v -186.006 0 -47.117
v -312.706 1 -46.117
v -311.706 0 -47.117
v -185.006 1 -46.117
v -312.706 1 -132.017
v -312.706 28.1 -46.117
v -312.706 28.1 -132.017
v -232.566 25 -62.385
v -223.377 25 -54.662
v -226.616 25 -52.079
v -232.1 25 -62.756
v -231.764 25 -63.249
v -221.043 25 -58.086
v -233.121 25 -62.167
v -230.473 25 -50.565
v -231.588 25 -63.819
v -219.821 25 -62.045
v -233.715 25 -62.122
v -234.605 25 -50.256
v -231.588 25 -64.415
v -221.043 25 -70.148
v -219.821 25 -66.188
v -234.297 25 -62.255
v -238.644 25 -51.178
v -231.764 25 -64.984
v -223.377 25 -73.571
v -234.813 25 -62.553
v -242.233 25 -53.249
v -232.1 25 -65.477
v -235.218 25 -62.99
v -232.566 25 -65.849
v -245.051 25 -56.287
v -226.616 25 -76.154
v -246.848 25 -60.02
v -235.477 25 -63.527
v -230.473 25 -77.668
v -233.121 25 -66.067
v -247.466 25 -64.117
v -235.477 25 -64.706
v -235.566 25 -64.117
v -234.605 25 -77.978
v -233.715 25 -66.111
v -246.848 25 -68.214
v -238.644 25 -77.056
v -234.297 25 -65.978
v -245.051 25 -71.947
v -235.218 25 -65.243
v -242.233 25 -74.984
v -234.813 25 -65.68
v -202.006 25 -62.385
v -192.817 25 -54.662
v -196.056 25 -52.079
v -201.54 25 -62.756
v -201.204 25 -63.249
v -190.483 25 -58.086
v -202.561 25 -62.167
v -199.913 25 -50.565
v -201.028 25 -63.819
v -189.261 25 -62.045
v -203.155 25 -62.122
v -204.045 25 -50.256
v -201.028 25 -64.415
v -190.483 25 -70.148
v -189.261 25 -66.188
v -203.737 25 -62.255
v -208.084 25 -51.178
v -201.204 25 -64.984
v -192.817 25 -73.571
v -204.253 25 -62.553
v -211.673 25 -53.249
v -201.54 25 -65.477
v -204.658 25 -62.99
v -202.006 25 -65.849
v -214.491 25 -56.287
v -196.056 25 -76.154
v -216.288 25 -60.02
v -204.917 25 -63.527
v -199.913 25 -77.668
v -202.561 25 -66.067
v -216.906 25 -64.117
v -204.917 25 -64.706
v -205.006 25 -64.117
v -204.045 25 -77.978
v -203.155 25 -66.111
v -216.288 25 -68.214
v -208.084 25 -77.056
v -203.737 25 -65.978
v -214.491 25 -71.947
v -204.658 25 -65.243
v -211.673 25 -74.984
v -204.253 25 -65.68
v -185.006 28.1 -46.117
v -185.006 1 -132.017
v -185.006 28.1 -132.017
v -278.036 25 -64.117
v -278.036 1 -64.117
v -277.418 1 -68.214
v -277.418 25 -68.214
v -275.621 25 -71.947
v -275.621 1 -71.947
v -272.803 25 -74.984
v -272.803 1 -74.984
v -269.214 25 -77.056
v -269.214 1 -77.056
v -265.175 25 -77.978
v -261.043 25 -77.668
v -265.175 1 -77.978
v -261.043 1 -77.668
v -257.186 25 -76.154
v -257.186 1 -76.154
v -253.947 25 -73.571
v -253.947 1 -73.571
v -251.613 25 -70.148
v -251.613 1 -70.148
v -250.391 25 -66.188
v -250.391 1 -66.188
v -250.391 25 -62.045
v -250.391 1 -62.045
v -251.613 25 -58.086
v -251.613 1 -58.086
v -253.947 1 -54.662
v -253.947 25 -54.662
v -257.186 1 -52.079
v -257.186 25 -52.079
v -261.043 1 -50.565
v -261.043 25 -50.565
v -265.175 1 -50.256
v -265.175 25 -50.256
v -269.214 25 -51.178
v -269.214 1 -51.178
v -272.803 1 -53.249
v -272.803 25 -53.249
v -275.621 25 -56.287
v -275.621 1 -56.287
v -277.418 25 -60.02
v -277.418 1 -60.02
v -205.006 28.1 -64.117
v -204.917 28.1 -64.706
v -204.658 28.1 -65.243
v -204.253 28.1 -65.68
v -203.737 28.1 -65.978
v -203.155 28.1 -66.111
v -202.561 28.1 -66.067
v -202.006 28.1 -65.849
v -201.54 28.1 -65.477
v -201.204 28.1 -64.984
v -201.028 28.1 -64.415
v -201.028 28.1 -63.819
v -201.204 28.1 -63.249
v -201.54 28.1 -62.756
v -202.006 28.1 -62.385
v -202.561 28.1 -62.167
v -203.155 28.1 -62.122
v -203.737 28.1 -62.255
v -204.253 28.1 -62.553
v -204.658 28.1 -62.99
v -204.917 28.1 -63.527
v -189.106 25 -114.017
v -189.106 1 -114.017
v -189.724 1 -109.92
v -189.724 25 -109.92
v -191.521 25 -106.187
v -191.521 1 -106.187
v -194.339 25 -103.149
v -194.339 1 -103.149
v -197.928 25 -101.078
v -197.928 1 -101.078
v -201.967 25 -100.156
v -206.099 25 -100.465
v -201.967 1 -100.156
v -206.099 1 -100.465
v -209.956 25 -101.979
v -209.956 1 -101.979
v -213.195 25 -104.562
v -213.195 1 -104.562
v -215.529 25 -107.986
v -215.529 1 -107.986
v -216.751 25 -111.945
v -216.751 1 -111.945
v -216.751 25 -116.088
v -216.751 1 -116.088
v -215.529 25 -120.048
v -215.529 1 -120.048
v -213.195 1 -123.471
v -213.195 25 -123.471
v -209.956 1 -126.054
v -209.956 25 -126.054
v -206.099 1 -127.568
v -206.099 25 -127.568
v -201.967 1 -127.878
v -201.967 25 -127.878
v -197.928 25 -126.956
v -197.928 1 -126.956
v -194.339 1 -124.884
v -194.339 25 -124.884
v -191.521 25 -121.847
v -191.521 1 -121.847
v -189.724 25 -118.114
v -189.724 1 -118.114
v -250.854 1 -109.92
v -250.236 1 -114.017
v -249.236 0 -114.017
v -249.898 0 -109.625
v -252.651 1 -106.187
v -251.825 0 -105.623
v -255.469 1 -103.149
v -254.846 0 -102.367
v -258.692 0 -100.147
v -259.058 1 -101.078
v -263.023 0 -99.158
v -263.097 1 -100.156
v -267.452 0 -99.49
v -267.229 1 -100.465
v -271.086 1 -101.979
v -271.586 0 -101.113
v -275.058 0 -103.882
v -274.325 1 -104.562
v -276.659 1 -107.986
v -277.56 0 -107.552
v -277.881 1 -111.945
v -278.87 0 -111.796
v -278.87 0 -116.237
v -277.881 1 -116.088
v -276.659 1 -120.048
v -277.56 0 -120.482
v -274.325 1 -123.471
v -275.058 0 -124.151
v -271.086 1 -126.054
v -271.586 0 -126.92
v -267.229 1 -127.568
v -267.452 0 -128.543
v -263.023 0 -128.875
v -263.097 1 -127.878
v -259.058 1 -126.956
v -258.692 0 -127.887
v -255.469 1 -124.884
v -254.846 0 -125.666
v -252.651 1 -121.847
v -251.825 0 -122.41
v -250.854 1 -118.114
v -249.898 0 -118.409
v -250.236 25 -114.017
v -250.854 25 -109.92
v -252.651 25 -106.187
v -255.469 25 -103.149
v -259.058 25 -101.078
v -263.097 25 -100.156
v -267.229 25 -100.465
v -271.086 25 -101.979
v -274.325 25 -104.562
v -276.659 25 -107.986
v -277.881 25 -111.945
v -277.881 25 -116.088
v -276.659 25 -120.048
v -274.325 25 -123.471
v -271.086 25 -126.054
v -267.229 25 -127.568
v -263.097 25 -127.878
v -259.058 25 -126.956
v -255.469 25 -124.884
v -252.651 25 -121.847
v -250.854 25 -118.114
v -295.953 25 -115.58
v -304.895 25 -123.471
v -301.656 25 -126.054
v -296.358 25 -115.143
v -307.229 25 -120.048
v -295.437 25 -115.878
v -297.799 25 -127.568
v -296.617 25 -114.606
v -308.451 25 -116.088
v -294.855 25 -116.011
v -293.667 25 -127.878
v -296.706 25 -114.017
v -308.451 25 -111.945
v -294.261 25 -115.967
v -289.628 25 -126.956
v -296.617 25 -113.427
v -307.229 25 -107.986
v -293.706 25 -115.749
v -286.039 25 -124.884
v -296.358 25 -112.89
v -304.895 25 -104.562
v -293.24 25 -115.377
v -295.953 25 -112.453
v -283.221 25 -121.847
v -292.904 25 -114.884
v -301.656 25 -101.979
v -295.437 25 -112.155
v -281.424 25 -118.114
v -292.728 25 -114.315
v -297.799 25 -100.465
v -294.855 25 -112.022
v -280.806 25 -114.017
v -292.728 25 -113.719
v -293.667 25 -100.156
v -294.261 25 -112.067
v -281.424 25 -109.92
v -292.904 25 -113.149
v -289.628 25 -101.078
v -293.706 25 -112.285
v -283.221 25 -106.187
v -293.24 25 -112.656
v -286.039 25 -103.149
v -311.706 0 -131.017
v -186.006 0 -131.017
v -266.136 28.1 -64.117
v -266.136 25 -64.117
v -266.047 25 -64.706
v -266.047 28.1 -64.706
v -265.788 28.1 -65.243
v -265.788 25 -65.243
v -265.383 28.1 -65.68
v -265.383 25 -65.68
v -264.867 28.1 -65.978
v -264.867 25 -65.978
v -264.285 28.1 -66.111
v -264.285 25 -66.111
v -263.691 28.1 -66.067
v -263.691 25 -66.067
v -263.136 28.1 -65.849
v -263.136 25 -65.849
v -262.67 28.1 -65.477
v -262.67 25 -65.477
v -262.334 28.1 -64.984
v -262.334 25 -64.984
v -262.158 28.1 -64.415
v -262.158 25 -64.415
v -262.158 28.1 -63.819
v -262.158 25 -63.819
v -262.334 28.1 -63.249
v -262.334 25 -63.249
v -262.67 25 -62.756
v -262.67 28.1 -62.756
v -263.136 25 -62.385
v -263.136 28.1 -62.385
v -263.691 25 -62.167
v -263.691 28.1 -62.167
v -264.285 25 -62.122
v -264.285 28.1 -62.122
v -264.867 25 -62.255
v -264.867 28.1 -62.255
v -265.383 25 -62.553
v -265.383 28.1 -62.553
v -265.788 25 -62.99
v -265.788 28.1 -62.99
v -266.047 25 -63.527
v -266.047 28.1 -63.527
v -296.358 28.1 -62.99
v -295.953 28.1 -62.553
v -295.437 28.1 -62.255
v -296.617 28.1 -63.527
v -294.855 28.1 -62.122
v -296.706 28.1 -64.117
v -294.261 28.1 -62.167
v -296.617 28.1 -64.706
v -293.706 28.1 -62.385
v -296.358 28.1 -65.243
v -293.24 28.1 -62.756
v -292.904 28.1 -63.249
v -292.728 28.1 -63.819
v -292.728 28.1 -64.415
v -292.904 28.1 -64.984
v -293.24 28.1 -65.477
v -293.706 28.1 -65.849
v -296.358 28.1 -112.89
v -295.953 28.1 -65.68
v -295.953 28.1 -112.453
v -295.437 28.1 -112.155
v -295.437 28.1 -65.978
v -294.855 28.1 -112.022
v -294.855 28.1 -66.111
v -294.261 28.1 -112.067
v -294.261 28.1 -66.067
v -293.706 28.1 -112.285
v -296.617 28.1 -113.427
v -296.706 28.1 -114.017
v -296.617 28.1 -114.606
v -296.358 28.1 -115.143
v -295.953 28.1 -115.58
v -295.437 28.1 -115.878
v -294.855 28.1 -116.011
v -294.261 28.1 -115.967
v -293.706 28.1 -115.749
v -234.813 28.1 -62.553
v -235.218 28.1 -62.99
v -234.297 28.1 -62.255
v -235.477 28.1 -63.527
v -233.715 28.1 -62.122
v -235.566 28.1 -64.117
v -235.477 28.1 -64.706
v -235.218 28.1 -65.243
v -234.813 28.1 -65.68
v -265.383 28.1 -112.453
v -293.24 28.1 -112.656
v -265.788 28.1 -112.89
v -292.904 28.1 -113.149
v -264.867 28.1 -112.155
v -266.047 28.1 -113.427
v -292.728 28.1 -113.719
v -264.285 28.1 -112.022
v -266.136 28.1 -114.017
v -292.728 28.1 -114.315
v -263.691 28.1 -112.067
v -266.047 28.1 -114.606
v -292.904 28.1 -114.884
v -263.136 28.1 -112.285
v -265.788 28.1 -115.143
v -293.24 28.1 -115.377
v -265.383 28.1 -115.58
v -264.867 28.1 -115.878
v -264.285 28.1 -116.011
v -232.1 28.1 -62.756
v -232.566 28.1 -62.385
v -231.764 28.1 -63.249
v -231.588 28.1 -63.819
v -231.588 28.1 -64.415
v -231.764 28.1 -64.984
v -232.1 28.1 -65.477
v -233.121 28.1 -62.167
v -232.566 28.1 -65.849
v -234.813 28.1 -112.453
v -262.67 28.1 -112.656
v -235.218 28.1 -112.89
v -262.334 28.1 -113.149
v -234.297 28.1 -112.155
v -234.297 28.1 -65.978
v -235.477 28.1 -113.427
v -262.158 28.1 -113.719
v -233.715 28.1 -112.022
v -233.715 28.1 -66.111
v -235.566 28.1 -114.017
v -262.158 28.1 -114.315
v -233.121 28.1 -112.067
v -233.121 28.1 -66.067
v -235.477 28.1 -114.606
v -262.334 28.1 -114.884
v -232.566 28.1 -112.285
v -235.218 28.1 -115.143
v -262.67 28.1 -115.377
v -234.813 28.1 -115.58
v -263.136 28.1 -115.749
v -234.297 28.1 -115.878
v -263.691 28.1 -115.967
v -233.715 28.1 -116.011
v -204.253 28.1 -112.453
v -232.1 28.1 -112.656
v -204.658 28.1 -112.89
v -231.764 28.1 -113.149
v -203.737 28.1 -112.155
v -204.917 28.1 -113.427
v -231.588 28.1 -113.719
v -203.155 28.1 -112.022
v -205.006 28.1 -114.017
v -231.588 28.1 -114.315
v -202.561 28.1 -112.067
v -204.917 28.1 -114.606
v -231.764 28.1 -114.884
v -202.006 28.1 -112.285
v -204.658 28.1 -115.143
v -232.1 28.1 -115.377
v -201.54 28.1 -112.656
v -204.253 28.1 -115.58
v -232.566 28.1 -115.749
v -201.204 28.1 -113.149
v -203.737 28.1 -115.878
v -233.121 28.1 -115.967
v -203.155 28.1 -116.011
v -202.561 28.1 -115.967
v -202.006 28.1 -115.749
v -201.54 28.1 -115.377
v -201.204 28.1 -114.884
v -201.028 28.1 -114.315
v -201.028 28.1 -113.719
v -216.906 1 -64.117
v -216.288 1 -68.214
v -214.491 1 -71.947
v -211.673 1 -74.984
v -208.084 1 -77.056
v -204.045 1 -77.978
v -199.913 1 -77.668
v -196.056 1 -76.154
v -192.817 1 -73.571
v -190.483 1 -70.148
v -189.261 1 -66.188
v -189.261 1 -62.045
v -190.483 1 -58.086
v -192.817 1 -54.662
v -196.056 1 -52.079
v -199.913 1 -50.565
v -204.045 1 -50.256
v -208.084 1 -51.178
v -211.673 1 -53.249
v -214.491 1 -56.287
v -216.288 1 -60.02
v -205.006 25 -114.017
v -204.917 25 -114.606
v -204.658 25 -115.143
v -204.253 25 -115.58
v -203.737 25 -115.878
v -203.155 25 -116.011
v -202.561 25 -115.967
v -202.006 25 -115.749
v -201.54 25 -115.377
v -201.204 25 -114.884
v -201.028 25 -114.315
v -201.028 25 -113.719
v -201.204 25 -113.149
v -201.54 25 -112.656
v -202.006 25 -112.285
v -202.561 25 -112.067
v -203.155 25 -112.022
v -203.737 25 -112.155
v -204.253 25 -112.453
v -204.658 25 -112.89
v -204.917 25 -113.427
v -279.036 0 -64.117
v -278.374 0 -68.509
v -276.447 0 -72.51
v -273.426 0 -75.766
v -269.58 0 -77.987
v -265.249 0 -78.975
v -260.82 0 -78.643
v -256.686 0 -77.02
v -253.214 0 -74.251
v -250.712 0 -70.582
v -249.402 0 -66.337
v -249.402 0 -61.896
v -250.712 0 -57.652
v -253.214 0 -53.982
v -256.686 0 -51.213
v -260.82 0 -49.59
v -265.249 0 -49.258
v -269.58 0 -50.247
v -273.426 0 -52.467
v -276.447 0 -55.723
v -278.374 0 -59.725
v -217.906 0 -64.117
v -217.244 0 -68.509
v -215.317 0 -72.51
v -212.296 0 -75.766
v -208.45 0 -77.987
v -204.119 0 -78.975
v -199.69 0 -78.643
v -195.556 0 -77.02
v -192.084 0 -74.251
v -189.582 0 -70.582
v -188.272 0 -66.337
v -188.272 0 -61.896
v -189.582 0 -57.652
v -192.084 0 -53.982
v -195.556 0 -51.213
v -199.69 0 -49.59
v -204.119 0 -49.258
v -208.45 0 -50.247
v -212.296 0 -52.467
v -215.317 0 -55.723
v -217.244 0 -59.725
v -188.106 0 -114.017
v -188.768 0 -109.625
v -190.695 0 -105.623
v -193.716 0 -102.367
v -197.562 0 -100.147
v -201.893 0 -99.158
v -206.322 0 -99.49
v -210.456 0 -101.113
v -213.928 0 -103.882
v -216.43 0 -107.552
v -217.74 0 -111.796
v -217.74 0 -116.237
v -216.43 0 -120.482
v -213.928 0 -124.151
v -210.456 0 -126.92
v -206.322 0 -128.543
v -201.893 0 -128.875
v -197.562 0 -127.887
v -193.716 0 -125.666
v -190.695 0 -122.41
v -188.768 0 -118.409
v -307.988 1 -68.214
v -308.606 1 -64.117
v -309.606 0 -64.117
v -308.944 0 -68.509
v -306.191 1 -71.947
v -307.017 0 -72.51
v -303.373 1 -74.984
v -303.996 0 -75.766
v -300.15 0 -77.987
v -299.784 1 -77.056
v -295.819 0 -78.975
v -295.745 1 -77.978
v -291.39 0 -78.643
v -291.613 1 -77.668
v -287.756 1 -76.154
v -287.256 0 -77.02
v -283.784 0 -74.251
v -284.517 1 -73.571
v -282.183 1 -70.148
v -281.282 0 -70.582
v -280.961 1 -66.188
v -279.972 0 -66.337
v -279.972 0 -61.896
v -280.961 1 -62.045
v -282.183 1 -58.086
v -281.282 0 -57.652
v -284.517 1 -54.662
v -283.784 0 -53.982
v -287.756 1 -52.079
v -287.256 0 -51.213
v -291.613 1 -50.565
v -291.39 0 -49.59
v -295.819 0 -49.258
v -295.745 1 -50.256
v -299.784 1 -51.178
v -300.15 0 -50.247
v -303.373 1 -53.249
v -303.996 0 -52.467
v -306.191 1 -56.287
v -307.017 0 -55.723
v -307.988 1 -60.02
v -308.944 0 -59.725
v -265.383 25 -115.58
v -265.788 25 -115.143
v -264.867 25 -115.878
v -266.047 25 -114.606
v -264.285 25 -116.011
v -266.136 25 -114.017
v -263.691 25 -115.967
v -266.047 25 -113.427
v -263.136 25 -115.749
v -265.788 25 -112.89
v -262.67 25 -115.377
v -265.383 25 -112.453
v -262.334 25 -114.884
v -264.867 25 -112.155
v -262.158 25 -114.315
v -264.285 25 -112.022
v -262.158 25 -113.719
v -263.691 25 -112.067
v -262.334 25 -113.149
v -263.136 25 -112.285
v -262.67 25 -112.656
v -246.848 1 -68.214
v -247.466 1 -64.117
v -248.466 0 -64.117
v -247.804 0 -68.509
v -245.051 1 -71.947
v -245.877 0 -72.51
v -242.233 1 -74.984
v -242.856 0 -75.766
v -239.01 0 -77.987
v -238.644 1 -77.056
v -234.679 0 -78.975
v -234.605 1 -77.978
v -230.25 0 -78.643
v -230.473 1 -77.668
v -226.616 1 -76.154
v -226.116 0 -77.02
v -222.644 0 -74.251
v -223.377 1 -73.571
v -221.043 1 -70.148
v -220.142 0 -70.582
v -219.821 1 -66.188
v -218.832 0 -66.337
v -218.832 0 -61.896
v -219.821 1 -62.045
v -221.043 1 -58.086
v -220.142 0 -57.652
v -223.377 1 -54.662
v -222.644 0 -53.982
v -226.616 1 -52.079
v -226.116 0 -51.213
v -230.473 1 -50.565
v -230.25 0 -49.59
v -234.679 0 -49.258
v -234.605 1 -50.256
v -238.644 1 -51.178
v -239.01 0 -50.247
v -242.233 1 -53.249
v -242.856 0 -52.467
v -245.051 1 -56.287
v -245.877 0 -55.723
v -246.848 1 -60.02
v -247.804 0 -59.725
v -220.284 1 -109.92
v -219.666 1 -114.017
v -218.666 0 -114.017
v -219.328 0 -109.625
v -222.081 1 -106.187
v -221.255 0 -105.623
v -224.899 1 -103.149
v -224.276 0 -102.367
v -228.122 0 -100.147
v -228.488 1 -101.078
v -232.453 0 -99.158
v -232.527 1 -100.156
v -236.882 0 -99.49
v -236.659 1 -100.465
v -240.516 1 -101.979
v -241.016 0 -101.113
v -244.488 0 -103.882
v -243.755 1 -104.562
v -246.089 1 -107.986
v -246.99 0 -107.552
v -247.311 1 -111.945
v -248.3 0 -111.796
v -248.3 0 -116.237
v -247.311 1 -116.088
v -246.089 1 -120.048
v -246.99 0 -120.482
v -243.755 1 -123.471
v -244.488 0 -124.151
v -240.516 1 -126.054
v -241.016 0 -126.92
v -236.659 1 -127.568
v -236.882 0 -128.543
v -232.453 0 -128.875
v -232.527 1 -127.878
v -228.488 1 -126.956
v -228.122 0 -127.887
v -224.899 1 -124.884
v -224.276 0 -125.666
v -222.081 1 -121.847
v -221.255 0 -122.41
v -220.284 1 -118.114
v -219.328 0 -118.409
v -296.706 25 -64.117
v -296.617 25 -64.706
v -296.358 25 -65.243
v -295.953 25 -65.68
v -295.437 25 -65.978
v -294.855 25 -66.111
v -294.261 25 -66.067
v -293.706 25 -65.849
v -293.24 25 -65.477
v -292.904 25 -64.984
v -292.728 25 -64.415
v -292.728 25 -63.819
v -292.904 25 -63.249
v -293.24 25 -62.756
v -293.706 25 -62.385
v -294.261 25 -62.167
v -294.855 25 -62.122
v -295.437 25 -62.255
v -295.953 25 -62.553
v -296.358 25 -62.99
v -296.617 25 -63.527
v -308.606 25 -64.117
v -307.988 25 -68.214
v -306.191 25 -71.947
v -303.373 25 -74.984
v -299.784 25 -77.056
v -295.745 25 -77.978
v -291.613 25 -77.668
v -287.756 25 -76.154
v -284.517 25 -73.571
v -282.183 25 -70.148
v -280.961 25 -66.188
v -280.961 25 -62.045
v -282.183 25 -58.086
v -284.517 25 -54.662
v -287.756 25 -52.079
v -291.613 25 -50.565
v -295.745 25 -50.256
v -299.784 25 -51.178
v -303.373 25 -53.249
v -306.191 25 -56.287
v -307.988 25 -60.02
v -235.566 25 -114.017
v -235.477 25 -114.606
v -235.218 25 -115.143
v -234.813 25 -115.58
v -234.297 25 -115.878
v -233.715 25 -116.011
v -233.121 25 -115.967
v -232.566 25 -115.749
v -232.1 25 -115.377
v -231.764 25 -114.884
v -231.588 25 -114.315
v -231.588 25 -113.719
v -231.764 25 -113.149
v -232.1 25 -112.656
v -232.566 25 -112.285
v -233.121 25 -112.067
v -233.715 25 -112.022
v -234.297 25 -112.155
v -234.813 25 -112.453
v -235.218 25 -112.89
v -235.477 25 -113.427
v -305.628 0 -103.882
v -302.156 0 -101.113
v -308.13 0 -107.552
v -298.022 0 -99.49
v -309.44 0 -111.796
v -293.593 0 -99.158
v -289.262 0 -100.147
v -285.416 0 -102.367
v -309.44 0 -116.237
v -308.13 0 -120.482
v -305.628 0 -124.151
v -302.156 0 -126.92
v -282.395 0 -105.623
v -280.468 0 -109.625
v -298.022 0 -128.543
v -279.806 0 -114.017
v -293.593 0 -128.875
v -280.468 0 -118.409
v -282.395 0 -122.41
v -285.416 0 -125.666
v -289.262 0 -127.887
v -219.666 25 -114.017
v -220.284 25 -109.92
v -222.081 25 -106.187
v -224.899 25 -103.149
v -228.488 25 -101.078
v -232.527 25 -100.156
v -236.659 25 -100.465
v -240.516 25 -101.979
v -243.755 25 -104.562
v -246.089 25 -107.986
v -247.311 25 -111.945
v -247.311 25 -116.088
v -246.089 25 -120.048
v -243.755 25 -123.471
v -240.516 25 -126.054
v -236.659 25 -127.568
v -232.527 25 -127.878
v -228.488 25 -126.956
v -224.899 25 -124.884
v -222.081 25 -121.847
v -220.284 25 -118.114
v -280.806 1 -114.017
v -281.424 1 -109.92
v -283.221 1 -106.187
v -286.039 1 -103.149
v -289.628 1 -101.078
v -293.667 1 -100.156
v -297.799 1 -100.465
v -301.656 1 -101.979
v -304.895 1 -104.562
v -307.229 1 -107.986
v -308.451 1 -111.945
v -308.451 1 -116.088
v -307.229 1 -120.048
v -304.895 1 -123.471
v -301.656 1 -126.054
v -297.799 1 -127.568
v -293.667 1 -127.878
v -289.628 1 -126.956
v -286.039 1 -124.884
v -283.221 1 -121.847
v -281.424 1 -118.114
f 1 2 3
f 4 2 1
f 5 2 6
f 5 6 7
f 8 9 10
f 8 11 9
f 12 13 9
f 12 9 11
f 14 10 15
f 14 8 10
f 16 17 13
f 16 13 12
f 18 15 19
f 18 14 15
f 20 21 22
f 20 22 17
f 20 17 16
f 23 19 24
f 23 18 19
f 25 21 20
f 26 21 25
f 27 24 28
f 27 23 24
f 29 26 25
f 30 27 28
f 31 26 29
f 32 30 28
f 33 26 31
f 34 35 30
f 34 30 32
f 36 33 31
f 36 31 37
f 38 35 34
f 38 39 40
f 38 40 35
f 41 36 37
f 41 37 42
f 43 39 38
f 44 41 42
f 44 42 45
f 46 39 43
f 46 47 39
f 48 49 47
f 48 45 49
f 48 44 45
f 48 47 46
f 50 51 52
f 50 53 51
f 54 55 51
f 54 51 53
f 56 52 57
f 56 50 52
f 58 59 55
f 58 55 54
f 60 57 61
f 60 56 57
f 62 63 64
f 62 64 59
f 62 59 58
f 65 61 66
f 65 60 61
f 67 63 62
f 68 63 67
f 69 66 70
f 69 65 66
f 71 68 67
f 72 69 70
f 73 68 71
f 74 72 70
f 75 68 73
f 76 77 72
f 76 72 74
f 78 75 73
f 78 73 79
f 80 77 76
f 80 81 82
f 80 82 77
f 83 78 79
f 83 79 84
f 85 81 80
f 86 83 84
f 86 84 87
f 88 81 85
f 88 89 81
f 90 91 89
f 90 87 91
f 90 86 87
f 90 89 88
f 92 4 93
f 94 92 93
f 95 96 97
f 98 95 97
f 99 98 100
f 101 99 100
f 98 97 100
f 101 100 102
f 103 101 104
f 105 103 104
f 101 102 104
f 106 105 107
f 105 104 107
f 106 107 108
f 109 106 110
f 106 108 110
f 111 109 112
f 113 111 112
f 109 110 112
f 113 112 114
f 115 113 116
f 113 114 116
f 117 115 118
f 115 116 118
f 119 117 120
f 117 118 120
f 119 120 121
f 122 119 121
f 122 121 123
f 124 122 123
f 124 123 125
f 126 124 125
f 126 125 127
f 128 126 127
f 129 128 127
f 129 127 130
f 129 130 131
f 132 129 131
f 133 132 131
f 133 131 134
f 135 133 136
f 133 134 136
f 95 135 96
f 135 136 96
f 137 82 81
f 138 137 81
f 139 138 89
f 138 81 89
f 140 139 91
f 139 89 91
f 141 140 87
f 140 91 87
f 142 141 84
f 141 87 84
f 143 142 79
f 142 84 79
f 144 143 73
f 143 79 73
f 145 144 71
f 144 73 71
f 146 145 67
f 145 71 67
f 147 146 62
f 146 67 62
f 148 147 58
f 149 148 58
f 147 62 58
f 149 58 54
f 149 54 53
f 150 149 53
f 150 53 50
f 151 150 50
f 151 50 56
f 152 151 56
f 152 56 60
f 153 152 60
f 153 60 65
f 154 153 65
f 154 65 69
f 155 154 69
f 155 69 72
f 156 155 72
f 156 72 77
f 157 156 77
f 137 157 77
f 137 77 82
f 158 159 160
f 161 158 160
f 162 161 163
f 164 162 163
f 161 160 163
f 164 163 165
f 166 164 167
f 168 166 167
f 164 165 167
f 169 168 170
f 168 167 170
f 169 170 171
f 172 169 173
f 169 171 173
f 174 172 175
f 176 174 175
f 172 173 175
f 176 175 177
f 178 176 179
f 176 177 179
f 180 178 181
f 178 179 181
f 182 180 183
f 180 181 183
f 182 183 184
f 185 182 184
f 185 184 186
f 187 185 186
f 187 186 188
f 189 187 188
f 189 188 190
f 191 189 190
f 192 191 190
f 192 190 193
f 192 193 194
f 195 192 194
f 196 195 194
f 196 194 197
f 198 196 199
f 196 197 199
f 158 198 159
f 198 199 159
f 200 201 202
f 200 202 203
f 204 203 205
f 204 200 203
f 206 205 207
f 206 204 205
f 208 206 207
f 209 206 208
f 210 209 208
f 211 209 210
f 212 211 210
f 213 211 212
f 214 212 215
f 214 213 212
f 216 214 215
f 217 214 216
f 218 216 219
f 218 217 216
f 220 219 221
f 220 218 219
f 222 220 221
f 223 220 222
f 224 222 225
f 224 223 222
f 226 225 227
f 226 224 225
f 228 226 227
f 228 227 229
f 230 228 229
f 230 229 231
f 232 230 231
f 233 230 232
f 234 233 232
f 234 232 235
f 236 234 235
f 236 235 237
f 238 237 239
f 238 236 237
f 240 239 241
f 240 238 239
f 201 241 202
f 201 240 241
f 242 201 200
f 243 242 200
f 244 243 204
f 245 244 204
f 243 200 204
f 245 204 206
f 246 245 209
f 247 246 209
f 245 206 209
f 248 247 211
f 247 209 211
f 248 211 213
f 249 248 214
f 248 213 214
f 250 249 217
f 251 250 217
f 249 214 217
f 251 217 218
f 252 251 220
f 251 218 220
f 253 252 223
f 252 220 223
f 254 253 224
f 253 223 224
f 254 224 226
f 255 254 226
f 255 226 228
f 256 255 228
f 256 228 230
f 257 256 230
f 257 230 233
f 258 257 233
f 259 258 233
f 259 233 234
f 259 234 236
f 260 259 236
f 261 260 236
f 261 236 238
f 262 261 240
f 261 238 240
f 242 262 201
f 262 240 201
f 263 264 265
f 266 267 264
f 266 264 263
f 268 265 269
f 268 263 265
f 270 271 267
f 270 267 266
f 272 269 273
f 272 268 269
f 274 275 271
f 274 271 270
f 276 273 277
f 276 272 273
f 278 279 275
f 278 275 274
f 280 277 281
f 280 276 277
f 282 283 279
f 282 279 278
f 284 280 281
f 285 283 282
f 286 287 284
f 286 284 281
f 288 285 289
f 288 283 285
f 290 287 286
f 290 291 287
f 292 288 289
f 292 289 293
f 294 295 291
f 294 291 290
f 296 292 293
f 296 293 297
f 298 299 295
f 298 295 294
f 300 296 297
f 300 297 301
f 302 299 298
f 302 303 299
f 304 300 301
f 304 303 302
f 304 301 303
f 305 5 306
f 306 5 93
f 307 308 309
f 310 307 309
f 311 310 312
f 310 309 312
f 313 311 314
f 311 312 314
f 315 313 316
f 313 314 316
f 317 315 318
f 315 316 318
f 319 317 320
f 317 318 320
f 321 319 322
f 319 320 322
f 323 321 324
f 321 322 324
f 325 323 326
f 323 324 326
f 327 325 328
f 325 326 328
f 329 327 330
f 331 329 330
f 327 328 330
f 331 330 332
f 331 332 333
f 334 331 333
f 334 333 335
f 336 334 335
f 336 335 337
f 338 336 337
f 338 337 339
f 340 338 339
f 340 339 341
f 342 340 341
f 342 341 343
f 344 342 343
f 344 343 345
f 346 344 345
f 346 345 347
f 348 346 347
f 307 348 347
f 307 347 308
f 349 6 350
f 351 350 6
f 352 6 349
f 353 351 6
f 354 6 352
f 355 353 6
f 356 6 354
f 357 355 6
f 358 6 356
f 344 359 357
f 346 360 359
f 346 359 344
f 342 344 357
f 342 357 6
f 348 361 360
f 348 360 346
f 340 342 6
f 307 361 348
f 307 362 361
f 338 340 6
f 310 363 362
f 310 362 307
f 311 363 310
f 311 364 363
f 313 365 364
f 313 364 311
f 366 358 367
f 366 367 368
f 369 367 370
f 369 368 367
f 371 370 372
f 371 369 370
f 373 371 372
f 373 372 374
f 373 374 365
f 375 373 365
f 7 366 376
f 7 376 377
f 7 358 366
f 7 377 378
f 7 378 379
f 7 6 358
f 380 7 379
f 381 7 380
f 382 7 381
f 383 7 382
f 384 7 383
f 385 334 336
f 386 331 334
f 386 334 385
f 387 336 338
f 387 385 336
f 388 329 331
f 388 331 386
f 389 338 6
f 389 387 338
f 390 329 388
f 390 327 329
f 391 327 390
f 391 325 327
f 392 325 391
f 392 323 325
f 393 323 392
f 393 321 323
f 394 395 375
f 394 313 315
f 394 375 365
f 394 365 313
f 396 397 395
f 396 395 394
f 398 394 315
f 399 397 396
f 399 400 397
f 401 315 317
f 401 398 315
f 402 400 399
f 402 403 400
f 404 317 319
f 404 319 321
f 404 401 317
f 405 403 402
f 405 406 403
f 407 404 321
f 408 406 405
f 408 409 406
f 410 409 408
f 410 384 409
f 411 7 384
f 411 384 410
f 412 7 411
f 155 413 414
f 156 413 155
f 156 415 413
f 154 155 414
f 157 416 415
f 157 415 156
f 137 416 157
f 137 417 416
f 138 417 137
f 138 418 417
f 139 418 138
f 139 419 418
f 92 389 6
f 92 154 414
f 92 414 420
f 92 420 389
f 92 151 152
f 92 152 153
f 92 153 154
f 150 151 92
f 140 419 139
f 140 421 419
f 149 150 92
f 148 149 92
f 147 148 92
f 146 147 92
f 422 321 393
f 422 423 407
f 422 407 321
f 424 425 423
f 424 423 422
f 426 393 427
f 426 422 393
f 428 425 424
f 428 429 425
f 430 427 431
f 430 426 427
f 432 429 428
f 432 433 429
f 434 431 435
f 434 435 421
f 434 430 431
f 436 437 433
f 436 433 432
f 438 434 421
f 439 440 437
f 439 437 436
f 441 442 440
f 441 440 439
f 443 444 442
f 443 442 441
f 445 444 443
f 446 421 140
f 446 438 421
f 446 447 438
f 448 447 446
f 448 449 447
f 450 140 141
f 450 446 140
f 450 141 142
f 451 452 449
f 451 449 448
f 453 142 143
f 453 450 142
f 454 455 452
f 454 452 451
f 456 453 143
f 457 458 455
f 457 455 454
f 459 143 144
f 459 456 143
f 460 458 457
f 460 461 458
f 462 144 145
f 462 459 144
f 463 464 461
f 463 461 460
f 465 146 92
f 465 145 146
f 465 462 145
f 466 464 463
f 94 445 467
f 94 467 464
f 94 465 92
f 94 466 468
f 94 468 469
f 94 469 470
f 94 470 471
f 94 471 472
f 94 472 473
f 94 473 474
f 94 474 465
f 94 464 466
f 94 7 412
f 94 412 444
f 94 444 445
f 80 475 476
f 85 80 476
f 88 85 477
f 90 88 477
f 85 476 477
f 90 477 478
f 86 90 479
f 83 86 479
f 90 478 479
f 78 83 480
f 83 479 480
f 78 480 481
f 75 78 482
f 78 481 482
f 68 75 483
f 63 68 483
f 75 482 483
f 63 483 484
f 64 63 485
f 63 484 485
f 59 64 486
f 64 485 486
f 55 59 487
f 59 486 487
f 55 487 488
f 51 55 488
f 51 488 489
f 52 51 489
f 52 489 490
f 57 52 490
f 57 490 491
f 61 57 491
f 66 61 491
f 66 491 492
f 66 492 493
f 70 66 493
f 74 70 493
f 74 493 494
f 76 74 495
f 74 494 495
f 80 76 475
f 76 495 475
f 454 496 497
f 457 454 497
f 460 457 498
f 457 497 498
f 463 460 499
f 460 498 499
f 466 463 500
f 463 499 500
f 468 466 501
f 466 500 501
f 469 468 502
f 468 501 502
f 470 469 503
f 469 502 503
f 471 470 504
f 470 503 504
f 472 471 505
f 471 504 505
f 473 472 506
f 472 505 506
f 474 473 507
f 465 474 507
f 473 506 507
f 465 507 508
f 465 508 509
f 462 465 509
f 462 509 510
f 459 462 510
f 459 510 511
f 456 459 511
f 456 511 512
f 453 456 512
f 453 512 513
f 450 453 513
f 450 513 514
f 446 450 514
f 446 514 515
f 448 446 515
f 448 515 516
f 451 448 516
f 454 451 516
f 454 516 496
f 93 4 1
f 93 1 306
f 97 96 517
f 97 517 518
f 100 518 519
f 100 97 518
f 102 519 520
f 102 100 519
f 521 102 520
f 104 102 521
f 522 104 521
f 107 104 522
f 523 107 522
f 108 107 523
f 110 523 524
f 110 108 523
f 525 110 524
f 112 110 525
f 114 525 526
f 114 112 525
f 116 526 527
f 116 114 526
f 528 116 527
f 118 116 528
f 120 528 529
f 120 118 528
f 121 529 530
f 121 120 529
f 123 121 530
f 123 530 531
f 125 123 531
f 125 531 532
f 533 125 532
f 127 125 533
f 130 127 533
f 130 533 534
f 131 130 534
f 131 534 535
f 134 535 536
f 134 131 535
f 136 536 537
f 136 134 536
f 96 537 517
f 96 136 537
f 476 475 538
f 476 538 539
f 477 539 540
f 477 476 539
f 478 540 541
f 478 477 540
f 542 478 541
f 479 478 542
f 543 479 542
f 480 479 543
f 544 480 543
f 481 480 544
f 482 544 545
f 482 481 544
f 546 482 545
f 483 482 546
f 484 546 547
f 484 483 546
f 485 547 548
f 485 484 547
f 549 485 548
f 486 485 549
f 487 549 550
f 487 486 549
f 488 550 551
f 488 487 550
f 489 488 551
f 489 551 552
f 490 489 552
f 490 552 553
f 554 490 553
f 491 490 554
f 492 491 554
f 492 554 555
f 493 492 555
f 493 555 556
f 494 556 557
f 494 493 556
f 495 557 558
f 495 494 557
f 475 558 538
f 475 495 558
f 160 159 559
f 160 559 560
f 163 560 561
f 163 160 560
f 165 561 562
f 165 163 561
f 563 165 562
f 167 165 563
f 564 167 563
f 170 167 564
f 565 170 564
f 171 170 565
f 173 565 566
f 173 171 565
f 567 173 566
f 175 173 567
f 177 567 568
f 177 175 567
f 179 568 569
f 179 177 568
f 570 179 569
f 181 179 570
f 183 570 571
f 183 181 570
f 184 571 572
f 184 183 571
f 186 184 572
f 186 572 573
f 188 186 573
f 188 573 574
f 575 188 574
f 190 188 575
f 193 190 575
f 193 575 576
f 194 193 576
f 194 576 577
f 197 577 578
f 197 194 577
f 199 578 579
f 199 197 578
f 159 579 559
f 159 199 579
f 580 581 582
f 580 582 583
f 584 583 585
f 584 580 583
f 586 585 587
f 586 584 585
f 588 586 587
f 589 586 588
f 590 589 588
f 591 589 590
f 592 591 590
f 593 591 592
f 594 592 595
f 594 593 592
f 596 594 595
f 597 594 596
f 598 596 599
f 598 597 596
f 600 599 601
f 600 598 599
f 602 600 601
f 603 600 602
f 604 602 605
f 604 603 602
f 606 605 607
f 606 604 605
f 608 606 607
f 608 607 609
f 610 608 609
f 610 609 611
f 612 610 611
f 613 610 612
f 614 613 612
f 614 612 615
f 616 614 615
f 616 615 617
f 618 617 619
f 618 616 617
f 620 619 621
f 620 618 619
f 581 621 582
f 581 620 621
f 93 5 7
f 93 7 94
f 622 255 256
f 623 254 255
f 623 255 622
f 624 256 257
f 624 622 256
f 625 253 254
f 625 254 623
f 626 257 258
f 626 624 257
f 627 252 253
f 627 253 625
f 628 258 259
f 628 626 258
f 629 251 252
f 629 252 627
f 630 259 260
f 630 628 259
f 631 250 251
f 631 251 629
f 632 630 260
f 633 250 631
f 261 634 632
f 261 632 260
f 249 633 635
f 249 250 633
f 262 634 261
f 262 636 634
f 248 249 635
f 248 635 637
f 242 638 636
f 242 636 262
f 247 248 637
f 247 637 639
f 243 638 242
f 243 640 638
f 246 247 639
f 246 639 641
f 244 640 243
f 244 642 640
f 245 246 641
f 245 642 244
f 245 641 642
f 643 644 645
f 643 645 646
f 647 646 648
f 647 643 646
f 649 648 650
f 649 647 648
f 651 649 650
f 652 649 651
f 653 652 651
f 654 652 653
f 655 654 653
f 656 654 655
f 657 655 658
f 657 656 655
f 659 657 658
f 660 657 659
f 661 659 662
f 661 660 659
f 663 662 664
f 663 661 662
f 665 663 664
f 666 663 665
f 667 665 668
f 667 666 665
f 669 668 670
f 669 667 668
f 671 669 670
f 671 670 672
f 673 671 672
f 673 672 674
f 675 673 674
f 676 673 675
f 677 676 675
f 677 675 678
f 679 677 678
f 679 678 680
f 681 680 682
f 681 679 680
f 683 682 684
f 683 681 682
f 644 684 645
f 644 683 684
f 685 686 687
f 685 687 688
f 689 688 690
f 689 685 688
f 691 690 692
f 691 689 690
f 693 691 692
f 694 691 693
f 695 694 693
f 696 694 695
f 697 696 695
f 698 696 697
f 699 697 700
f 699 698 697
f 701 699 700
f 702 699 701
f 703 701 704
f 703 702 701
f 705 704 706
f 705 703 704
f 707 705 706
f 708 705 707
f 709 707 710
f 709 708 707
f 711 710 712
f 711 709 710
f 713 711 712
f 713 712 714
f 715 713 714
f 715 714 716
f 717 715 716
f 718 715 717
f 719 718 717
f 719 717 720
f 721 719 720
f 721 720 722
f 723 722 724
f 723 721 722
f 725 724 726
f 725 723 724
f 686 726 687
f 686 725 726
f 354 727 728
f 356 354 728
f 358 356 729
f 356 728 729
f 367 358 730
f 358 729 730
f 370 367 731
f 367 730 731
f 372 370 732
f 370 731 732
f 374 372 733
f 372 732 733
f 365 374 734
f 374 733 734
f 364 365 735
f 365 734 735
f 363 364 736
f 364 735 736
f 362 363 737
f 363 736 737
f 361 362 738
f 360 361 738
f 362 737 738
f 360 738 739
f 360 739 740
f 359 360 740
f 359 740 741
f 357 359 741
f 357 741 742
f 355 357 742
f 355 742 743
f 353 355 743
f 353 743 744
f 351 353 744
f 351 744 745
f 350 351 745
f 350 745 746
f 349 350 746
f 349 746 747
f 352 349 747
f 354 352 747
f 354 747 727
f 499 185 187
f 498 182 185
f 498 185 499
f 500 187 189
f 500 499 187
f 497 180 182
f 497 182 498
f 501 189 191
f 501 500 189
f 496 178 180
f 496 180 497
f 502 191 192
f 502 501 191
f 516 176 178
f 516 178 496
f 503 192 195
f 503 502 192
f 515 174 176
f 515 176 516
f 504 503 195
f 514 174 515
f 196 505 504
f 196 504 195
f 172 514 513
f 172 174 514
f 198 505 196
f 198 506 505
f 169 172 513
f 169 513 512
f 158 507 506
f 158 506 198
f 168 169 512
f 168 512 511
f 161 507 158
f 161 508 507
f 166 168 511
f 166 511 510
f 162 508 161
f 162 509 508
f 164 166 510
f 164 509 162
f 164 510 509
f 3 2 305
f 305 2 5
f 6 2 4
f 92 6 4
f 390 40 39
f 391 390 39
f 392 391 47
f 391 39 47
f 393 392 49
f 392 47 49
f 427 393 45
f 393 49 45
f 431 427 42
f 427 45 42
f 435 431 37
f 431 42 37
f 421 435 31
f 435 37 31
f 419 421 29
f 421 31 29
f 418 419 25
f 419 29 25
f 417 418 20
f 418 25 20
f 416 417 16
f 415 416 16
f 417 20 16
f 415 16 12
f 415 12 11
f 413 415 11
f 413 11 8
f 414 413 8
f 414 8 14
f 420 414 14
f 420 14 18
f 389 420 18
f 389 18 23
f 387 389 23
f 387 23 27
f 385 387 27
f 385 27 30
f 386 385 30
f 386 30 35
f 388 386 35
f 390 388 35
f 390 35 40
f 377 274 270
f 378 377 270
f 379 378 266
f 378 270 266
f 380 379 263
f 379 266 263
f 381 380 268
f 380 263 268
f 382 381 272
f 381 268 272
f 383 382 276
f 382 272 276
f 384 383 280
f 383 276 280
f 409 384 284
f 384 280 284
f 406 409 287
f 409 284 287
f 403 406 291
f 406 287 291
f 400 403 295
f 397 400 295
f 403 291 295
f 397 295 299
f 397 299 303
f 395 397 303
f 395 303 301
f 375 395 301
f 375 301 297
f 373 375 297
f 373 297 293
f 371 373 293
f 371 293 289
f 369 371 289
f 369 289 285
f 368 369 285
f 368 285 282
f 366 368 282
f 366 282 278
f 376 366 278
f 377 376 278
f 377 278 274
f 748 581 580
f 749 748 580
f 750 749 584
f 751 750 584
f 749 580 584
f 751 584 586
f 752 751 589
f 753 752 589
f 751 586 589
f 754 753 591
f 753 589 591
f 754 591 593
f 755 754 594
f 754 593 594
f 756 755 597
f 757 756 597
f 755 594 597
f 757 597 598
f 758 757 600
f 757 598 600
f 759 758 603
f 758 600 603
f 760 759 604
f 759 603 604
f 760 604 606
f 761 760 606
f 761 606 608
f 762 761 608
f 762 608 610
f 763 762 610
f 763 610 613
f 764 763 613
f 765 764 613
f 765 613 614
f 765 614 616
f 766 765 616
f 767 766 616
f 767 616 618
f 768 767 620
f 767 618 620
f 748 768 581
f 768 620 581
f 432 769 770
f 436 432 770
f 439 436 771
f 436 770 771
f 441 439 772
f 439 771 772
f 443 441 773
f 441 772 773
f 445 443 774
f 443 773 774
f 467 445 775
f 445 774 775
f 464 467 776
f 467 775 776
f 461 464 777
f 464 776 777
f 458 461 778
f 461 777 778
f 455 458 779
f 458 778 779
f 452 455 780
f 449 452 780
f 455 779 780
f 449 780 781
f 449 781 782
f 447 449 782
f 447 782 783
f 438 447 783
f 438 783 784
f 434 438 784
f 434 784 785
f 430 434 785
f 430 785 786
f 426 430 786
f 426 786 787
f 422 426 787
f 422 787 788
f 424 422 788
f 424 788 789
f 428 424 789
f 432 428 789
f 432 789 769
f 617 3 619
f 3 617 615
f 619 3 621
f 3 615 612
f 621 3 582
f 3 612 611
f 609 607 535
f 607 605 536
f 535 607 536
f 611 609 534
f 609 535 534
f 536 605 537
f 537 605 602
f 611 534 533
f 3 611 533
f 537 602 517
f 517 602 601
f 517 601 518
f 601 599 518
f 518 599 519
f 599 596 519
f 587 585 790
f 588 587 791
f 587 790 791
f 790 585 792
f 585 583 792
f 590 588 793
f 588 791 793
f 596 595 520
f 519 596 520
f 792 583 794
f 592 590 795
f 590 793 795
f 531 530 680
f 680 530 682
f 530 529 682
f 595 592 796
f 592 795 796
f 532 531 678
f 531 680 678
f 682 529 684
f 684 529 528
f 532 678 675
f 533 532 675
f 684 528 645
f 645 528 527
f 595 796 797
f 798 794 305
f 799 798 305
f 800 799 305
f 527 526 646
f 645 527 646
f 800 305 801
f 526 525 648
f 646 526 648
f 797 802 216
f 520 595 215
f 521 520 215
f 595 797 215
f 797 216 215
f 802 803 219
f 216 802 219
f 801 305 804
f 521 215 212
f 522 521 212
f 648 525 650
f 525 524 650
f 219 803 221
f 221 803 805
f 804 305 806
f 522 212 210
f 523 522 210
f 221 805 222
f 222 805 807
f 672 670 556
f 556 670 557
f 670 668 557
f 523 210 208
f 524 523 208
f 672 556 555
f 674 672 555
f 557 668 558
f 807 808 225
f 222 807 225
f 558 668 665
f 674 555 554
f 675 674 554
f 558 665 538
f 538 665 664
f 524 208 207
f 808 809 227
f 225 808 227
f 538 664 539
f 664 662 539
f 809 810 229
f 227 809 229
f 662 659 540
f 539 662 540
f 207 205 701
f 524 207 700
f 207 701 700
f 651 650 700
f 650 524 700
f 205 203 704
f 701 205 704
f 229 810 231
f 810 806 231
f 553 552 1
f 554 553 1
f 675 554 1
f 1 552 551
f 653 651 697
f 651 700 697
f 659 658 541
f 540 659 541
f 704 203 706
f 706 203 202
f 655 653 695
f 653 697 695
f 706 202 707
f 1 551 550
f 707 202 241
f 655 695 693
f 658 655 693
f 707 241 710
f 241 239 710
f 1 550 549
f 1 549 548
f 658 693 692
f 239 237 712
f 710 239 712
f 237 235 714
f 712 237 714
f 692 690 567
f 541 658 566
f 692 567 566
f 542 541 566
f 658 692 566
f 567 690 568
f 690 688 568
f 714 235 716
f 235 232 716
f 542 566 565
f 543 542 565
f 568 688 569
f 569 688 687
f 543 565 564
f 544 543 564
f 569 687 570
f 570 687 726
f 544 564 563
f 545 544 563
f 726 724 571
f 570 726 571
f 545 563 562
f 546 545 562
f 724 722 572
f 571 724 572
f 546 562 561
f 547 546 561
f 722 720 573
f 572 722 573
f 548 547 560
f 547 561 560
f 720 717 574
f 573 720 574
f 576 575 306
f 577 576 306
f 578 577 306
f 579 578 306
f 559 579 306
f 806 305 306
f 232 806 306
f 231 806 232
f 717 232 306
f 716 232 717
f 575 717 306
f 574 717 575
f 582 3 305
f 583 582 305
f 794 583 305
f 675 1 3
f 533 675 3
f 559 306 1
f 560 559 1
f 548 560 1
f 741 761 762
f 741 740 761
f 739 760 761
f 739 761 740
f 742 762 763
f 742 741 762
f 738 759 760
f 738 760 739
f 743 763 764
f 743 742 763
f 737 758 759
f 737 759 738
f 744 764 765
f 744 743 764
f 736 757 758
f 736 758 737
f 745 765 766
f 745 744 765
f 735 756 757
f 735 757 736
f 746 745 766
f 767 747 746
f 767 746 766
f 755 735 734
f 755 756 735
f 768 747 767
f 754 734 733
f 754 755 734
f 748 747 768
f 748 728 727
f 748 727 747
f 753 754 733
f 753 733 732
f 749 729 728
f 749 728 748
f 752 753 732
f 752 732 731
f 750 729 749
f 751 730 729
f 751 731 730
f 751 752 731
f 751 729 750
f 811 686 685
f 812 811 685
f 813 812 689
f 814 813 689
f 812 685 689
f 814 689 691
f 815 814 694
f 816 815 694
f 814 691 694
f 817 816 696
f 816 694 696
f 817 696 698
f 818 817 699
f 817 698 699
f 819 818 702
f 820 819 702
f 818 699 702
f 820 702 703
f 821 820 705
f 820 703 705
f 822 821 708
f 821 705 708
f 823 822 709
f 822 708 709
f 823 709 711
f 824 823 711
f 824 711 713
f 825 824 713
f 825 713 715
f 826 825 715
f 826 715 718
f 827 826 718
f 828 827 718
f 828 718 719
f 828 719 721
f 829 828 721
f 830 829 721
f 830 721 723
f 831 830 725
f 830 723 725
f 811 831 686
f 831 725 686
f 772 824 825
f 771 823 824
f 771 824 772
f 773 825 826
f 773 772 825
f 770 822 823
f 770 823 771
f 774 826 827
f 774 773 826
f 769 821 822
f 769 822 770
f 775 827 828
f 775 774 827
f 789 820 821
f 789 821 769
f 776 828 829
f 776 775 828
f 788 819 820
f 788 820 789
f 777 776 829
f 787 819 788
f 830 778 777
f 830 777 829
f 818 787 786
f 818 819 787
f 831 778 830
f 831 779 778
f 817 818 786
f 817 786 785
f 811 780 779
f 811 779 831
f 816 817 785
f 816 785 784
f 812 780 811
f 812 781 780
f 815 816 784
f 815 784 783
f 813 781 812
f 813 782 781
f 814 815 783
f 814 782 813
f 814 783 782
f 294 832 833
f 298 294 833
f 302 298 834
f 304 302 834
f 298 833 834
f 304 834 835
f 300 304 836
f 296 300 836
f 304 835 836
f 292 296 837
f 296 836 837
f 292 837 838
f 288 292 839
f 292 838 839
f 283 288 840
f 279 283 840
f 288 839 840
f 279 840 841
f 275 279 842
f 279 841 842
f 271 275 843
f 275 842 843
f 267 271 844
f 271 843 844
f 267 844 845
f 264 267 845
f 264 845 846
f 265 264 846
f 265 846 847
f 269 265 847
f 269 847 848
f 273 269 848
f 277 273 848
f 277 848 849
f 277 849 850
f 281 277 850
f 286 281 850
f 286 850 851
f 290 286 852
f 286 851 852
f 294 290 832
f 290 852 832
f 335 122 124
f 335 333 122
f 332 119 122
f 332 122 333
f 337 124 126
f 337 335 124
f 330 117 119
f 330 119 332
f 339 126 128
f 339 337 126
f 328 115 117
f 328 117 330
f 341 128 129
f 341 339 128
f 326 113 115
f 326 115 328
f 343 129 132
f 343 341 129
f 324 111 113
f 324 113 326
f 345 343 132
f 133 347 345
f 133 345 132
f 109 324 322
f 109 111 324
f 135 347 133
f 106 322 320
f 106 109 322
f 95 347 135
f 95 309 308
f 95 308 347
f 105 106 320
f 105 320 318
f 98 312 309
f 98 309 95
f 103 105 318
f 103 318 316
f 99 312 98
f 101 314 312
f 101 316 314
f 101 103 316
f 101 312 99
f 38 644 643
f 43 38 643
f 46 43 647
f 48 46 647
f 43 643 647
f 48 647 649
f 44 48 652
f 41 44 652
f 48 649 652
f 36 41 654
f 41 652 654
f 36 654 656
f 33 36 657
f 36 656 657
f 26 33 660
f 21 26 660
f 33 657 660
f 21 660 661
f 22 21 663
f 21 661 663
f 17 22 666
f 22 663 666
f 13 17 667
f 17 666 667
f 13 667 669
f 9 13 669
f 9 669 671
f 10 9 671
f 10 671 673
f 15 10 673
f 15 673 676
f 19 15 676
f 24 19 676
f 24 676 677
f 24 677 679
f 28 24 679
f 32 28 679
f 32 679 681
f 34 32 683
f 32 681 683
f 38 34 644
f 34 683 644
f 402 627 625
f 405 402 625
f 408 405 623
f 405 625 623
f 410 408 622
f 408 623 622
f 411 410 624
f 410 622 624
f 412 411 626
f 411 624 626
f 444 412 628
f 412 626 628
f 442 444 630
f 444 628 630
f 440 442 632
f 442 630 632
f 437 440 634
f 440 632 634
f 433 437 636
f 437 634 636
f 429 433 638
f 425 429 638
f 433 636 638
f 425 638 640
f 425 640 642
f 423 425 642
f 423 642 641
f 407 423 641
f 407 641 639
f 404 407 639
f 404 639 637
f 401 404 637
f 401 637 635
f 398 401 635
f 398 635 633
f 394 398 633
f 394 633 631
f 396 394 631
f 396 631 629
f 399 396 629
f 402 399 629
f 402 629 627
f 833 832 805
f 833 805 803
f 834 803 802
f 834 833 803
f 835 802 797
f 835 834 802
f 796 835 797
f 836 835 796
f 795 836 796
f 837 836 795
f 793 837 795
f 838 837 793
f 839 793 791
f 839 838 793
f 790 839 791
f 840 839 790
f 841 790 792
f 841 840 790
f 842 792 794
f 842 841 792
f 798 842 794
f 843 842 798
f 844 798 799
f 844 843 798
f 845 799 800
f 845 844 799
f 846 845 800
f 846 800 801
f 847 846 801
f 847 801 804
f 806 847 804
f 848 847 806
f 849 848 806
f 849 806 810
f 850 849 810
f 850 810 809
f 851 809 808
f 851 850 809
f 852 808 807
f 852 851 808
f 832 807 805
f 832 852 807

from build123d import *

# Parameters (mm, degrees)
SKETCH1_W           = 127.7
SKETCH1_H           = 85.9
BOSS_EXTRUDE1_DEPTH = 28.1
SKETCH2_R           = 13.9
CUT_EXTRUDE3_DEPTH  = 25
CHAMFER3_SIZE       = 1
CHAMFER4_SIZE       = 1
SKETCH3_R           = 13.9
CUT_EXTRUDE5_DEPTH  = 25
CHAMFER5_SIZE       = 1
CHAMFER6_SIZE       = 1
SKETCH5_R           = 2
CUT_EXTRUDE7_DEPTH  = 10


with BuildPart() as part:
    # Sketch1 → Boss-Extrude1 (new body)
    with BuildSketch(Plane(origin=(0, 0, 0), x_dir=(1, 0, 0), z_dir=(0, 1, 0))):
        with Locations((-248.856003869, 89.066665881)):
            Rectangle(SKETCH1_W, SKETCH1_H)
    extrude(amount=BOSS_EXTRUDE1_DEPTH)

    # Sketch2 → Cut-Extrude3 (cut)
    with BuildSketch(Plane(origin=(0, 0, 0), x_dir=(-1, 0, 0), z_dir=(0, -1, 0))):
        with Locations((294.706003869, 64.116665881)):
            Circle(SKETCH2_R)
        with Locations((264.136003869, 64.116665881)):
            Circle(SKETCH2_R)
        with Locations((233.566003869, 64.116665881)):
            Circle(SKETCH2_R)
        with Locations((203.006003869, 64.116665881)):
            Circle(SKETCH2_R)
    extrude(amount=-CUT_EXTRUDE3_DEPTH, mode=Mode.SUBTRACT)

    # Chamfer3
    chamfer3_edges = [part.edges().sort_by_distance(p)[0] for p in [
        (-250.236003869, 0, -64.116665881),
    ]]
    chamfer(chamfer3_edges, length=CHAMFER3_SIZE)

    # Chamfer4
    chamfer4_edges = [part.edges().sort_by_distance(p)[0] for p in [
        (-280.806003869, 0, -64.116665881),
        (-189.106003869, 0, -64.116665881),
        (-219.666003869, 0, -64.116665881),
    ]]
    chamfer(chamfer4_edges, length=CHAMFER4_SIZE)

    # Sketch3 → Cut-Extrude5 (cut)
    with BuildSketch(Plane.XZ):
        with Locations((-233.566003869, -114.016665881)):
            Circle(SKETCH3_R)
        with Locations((-264.136003869, -114.016665881)):
            Circle(SKETCH3_R)
        with Locations((-294.706003869, -114.016665881)):
            Circle(SKETCH3_R)
        with Locations((-203.006003869, -114.016665881)):
            Circle(SKETCH3_R)
    extrude(amount=-CUT_EXTRUDE5_DEPTH, mode=Mode.SUBTRACT)

    # Chamfer5
    chamfer5_edges = [part.edges().sort_by_distance(p)[0] for p in [
        (-308.606003869, 0, -114.016665881),
        (-278.036003869, 0, -114.016665881),
        (-216.906003869, 0, -114.016665881),
        (-247.466003869, 0, -114.016665881),
    ]]
    chamfer(chamfer5_edges, length=CHAMFER5_SIZE)

    # Chamfer6
    chamfer6_edges = [part.edges().sort_by_distance(p)[0] for p in [
        (-248.856003869, 0, -132.016665881),
        (-185.006003869, 0, -89.066665881),
        (-248.856003869, 0, -46.116665881),
        (-312.706003869, 0, -89.066665881),
    ]]
    chamfer(chamfer6_edges, length=CHAMFER6_SIZE)

    # Sketch5 → Cut-Extrude7 (cut)
    with BuildSketch(Plane(origin=(0, 25, 0), x_dir=(-1, 0, 0), z_dir=(0, -1, 0))):
        with Locations((294.706003869, 64.116665881)):
            Circle(SKETCH5_R)
        with Locations((264.136003869, 64.116665881)):
            Circle(SKETCH5_R)
        with Locations((233.566003869, 64.116665881)):
            Circle(SKETCH5_R)
        with Locations((203.006003869, 64.116665881)):
            Circle(SKETCH5_R)
        with Locations((294.706003869, 114.016665881)):
            Circle(SKETCH5_R)
        with Locations((264.136003869, 114.016665881)):
            Circle(SKETCH5_R)
        with Locations((233.566003869, 114.016665881)):
            Circle(SKETCH5_R)
        with Locations((203.006003869, 114.016665881)):
            Circle(SKETCH5_R)
    extrude(amount=-CUT_EXTRUDE7_DEPTH, mode=Mode.SUBTRACT)


solid = part.part
